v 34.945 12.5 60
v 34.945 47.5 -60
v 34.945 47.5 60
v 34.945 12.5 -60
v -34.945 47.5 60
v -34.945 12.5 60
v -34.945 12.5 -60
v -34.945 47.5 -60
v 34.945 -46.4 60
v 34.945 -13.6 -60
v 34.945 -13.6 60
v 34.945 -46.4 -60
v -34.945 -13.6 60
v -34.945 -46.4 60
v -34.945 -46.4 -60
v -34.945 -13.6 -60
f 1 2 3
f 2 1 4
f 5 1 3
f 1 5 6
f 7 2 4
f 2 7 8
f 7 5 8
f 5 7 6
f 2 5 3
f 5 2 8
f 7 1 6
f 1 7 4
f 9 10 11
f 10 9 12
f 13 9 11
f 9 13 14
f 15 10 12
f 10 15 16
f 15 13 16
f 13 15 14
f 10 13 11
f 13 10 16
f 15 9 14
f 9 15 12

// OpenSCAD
//$fa=0.01;
//$fs=0.5;

module tascam() {
	dimensions = [35,65,150];
	cube(dimensions,center=true);
}

//color("darkgray")
//tascam();

translate([0,30,0])
cube([69.89,35,120],center=true);

translate([0,-30,0])
cube([69.89,32.8,120],center=true);
